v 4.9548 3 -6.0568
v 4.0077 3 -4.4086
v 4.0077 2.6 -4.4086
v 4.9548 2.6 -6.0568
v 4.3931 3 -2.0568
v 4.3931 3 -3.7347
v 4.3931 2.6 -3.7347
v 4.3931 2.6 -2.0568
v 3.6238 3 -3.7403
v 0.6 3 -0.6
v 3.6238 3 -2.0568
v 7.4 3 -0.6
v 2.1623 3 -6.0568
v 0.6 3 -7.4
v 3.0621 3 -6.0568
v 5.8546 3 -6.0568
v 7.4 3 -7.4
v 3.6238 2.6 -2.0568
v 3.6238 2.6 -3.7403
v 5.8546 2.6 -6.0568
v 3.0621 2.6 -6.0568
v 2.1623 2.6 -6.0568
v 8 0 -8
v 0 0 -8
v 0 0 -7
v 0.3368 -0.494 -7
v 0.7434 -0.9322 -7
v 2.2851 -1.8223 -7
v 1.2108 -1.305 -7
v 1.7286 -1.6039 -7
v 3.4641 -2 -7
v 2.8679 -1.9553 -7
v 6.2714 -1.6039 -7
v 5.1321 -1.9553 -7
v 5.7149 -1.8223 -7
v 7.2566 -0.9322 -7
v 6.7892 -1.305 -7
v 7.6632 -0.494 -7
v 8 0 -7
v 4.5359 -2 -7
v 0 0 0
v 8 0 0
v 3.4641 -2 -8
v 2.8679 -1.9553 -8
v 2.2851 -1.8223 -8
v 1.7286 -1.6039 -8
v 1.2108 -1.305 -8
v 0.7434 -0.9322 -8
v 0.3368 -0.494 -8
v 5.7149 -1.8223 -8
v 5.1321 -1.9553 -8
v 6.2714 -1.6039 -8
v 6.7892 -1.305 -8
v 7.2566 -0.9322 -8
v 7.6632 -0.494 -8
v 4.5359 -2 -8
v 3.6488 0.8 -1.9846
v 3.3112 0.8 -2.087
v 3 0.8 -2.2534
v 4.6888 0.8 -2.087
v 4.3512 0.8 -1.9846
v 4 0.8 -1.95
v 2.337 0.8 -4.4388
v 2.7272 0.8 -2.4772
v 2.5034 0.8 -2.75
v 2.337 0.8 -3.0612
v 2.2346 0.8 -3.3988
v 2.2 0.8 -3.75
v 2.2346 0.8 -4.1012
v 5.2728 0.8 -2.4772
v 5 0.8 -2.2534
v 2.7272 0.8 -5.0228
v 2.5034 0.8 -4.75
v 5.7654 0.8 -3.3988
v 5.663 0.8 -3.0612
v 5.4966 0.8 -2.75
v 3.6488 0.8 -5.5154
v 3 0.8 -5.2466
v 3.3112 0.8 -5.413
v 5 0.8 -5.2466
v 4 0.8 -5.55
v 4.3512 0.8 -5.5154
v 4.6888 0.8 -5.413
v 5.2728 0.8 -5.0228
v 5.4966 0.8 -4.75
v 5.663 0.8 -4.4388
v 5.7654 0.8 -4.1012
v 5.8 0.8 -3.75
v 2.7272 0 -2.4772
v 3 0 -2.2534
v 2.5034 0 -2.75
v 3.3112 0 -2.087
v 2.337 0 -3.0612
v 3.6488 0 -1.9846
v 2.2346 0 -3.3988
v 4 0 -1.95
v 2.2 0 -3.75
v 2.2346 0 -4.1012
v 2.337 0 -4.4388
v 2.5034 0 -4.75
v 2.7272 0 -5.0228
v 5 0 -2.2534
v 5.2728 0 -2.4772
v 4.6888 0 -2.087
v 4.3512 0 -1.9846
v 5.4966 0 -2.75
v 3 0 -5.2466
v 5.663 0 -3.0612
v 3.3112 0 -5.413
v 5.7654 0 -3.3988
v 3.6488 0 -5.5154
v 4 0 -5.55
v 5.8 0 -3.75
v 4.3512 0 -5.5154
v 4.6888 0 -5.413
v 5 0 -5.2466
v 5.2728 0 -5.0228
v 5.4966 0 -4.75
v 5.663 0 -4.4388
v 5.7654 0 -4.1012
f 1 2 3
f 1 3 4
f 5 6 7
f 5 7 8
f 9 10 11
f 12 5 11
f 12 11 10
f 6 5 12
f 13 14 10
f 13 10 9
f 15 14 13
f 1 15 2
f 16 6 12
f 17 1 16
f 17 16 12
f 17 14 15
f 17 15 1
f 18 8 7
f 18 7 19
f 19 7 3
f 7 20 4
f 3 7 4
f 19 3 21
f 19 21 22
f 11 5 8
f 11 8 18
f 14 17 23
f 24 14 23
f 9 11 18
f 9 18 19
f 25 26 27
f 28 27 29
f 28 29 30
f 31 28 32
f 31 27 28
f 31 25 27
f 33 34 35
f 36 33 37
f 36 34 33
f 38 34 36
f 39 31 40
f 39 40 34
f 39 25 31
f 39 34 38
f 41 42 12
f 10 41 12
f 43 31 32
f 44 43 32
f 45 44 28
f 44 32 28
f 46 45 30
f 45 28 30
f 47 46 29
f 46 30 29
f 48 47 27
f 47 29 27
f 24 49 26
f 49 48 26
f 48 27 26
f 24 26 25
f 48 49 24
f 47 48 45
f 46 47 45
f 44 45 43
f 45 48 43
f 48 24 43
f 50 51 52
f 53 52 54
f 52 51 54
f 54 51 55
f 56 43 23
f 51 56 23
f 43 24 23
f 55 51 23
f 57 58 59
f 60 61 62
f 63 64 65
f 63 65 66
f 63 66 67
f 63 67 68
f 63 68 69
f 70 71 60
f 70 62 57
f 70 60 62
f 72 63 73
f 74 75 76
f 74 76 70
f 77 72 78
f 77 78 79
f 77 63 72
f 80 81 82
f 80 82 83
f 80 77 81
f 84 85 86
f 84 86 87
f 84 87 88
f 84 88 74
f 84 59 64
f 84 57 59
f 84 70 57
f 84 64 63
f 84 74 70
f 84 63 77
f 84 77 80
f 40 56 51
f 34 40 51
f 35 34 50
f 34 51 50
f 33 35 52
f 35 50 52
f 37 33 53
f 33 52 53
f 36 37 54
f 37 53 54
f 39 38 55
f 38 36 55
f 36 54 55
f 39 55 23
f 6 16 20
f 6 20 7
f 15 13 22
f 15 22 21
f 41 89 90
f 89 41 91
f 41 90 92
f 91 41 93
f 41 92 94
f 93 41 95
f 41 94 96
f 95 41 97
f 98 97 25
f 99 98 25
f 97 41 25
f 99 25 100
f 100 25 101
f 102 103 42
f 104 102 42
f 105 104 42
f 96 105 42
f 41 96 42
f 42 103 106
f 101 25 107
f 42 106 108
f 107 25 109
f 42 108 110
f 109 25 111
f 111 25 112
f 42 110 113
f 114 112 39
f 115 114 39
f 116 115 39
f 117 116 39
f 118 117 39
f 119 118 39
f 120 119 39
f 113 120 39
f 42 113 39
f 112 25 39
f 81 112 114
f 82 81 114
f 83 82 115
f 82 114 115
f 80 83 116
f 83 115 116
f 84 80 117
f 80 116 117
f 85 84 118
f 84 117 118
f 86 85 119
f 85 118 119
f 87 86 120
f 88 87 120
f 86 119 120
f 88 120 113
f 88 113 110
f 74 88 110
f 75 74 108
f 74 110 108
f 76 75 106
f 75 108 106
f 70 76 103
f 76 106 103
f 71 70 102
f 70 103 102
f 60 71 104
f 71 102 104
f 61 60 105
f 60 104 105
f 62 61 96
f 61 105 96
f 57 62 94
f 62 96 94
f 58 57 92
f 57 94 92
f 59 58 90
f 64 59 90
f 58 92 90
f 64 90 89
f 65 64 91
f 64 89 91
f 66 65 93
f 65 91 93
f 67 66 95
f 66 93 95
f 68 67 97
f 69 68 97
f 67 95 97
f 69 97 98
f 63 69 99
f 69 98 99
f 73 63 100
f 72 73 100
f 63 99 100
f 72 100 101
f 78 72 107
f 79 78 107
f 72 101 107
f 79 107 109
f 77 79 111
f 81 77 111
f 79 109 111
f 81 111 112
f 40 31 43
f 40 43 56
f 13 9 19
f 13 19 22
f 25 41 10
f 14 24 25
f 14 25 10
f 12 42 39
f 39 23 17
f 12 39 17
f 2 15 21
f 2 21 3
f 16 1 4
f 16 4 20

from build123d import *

# Parameters (mm, degrees)
SKETCH1_W               = 8
SKETCH1_H               = 8
BOSS_EXTRUDE1_DEPTH     = 3
CUT_EXTRUDE1_DEPTH      = 12.704699911
CUT_EXTRUDE1_DEPTH_BACK = 12.704699911
CUT_EXTRUDE2_DEPTH      = 11
SKETCH4_R               = 1.8
CUT_EXTRUDE3_DEPTH      = 0.8
SKETCH5_W               = 8
SKETCH5_H               = 1
BOSS_EXTRUDE2_DEPTH     = 2
FILLET1_R               = 4
CUT_EXTRUDE4_DEPTH      = 0.4


with BuildPart() as part:
    # Sketch1 → Boss-Extrude1 (new body)
    with BuildSketch(Plane(origin=(0, 0, 0), x_dir=(1, 0, 0), z_dir=(0, 1, 0))):
        with Locations((4, 4)):
            Rectangle(SKETCH1_W, SKETCH1_H)
    extrude(amount=BOSS_EXTRUDE1_DEPTH)

    # Sketch2 → Cut-Extrude1 (cut, two sides: drawn at the far end of the back side and taken through both)
    with BuildSketch(Plane.XY.offset(-CUT_EXTRUDE1_DEPTH_BACK)):
        Polygon((0, 0), (0.6, 3), (0, 3), align=None)
        Polygon((8, 0), (7.4, 3), (8, 3), align=None)
    extrude(amount=CUT_EXTRUDE1_DEPTH + CUT_EXTRUDE1_DEPTH_BACK, mode=Mode.SUBTRACT)

    # Sketch3 → Cut-Extrude2 (cut)
    with BuildSketch(Plane(origin=(0, 0, 0), x_dir=(0, 0, -1), z_dir=(1, 0, 0))):
        Polygon((0, 0), (0.6, 3), (0, 3), align=None)
        Polygon((8, 3), (7.4, 3), (8, 0), align=None)
    extrude(amount=CUT_EXTRUDE2_DEPTH, mode=Mode.SUBTRACT)

    # Sketch4 → Cut-Extrude3 (cut)
    with BuildSketch(Plane.XZ):
        with Locations(Location((4, -3.75, 0), (0, 0, 270))):
            Circle(SKETCH4_R)
    extrude(amount=-CUT_EXTRUDE3_DEPTH, mode=Mode.SUBTRACT)

    # Sketch5 → Boss-Extrude2 (add)
    with BuildSketch(Plane.XZ):
        with Locations((4, -7.5)):
            Rectangle(SKETCH5_W, SKETCH5_H)
    extrude(amount=BOSS_EXTRUDE2_DEPTH)

    # Fillet1
    # the kernel refuses this fillet: 4 mm, written as the material it takes off along each edge
    with BuildSketch(Plane(origin=(8, -2, -16.660254038), x_dir=(0, 1, 0), z_dir=(0, 0, 1)), Plane(origin=(0, -2, 1.660254038), x_dir=(0, 1, 0), z_dir=(0, 0, -1))) as fillet1_piece_1:
        with BuildLine():
            CenterArc((4, 3.464101615), FILLET1_R, 180, 60)
            Line((0, 3.464101615), (-0.08, 3.464101615))
            Line((-0.08, 3.464101615), (-0.08, 0))
            Line((-0.08, 0), (0, -0.08))
            ThreePointArc((0, -0.08), (1, -0.08), (1.96, -0.069282032))
            Line((1.96, -0.069282032), (2, 0))
        make_face()
    extrude(amount=18.320508076, mode=Mode.SUBTRACT)

    # Sketch6 → Cut-Extrude4 (cut)
    with BuildSketch(Plane(origin=(0, 3, 0), x_dir=(1, 0, 0), z_dir=(0, 1, 0))):
        Polygon((3.623842243, 2.056832464), (3.623842243, 3.740326053), (2.162303782, 6.056832464), (3.062143525, 6.056832464), (4.007656346, 4.408595284), (4.95477173, 6.056832464), (5.854611474, 6.056832464), (4.393073013, 3.734717079), (4.393073013, 2.056832464), align=None)
    extrude(amount=-CUT_EXTRUDE4_DEPTH, mode=Mode.SUBTRACT)


solid = part.part
